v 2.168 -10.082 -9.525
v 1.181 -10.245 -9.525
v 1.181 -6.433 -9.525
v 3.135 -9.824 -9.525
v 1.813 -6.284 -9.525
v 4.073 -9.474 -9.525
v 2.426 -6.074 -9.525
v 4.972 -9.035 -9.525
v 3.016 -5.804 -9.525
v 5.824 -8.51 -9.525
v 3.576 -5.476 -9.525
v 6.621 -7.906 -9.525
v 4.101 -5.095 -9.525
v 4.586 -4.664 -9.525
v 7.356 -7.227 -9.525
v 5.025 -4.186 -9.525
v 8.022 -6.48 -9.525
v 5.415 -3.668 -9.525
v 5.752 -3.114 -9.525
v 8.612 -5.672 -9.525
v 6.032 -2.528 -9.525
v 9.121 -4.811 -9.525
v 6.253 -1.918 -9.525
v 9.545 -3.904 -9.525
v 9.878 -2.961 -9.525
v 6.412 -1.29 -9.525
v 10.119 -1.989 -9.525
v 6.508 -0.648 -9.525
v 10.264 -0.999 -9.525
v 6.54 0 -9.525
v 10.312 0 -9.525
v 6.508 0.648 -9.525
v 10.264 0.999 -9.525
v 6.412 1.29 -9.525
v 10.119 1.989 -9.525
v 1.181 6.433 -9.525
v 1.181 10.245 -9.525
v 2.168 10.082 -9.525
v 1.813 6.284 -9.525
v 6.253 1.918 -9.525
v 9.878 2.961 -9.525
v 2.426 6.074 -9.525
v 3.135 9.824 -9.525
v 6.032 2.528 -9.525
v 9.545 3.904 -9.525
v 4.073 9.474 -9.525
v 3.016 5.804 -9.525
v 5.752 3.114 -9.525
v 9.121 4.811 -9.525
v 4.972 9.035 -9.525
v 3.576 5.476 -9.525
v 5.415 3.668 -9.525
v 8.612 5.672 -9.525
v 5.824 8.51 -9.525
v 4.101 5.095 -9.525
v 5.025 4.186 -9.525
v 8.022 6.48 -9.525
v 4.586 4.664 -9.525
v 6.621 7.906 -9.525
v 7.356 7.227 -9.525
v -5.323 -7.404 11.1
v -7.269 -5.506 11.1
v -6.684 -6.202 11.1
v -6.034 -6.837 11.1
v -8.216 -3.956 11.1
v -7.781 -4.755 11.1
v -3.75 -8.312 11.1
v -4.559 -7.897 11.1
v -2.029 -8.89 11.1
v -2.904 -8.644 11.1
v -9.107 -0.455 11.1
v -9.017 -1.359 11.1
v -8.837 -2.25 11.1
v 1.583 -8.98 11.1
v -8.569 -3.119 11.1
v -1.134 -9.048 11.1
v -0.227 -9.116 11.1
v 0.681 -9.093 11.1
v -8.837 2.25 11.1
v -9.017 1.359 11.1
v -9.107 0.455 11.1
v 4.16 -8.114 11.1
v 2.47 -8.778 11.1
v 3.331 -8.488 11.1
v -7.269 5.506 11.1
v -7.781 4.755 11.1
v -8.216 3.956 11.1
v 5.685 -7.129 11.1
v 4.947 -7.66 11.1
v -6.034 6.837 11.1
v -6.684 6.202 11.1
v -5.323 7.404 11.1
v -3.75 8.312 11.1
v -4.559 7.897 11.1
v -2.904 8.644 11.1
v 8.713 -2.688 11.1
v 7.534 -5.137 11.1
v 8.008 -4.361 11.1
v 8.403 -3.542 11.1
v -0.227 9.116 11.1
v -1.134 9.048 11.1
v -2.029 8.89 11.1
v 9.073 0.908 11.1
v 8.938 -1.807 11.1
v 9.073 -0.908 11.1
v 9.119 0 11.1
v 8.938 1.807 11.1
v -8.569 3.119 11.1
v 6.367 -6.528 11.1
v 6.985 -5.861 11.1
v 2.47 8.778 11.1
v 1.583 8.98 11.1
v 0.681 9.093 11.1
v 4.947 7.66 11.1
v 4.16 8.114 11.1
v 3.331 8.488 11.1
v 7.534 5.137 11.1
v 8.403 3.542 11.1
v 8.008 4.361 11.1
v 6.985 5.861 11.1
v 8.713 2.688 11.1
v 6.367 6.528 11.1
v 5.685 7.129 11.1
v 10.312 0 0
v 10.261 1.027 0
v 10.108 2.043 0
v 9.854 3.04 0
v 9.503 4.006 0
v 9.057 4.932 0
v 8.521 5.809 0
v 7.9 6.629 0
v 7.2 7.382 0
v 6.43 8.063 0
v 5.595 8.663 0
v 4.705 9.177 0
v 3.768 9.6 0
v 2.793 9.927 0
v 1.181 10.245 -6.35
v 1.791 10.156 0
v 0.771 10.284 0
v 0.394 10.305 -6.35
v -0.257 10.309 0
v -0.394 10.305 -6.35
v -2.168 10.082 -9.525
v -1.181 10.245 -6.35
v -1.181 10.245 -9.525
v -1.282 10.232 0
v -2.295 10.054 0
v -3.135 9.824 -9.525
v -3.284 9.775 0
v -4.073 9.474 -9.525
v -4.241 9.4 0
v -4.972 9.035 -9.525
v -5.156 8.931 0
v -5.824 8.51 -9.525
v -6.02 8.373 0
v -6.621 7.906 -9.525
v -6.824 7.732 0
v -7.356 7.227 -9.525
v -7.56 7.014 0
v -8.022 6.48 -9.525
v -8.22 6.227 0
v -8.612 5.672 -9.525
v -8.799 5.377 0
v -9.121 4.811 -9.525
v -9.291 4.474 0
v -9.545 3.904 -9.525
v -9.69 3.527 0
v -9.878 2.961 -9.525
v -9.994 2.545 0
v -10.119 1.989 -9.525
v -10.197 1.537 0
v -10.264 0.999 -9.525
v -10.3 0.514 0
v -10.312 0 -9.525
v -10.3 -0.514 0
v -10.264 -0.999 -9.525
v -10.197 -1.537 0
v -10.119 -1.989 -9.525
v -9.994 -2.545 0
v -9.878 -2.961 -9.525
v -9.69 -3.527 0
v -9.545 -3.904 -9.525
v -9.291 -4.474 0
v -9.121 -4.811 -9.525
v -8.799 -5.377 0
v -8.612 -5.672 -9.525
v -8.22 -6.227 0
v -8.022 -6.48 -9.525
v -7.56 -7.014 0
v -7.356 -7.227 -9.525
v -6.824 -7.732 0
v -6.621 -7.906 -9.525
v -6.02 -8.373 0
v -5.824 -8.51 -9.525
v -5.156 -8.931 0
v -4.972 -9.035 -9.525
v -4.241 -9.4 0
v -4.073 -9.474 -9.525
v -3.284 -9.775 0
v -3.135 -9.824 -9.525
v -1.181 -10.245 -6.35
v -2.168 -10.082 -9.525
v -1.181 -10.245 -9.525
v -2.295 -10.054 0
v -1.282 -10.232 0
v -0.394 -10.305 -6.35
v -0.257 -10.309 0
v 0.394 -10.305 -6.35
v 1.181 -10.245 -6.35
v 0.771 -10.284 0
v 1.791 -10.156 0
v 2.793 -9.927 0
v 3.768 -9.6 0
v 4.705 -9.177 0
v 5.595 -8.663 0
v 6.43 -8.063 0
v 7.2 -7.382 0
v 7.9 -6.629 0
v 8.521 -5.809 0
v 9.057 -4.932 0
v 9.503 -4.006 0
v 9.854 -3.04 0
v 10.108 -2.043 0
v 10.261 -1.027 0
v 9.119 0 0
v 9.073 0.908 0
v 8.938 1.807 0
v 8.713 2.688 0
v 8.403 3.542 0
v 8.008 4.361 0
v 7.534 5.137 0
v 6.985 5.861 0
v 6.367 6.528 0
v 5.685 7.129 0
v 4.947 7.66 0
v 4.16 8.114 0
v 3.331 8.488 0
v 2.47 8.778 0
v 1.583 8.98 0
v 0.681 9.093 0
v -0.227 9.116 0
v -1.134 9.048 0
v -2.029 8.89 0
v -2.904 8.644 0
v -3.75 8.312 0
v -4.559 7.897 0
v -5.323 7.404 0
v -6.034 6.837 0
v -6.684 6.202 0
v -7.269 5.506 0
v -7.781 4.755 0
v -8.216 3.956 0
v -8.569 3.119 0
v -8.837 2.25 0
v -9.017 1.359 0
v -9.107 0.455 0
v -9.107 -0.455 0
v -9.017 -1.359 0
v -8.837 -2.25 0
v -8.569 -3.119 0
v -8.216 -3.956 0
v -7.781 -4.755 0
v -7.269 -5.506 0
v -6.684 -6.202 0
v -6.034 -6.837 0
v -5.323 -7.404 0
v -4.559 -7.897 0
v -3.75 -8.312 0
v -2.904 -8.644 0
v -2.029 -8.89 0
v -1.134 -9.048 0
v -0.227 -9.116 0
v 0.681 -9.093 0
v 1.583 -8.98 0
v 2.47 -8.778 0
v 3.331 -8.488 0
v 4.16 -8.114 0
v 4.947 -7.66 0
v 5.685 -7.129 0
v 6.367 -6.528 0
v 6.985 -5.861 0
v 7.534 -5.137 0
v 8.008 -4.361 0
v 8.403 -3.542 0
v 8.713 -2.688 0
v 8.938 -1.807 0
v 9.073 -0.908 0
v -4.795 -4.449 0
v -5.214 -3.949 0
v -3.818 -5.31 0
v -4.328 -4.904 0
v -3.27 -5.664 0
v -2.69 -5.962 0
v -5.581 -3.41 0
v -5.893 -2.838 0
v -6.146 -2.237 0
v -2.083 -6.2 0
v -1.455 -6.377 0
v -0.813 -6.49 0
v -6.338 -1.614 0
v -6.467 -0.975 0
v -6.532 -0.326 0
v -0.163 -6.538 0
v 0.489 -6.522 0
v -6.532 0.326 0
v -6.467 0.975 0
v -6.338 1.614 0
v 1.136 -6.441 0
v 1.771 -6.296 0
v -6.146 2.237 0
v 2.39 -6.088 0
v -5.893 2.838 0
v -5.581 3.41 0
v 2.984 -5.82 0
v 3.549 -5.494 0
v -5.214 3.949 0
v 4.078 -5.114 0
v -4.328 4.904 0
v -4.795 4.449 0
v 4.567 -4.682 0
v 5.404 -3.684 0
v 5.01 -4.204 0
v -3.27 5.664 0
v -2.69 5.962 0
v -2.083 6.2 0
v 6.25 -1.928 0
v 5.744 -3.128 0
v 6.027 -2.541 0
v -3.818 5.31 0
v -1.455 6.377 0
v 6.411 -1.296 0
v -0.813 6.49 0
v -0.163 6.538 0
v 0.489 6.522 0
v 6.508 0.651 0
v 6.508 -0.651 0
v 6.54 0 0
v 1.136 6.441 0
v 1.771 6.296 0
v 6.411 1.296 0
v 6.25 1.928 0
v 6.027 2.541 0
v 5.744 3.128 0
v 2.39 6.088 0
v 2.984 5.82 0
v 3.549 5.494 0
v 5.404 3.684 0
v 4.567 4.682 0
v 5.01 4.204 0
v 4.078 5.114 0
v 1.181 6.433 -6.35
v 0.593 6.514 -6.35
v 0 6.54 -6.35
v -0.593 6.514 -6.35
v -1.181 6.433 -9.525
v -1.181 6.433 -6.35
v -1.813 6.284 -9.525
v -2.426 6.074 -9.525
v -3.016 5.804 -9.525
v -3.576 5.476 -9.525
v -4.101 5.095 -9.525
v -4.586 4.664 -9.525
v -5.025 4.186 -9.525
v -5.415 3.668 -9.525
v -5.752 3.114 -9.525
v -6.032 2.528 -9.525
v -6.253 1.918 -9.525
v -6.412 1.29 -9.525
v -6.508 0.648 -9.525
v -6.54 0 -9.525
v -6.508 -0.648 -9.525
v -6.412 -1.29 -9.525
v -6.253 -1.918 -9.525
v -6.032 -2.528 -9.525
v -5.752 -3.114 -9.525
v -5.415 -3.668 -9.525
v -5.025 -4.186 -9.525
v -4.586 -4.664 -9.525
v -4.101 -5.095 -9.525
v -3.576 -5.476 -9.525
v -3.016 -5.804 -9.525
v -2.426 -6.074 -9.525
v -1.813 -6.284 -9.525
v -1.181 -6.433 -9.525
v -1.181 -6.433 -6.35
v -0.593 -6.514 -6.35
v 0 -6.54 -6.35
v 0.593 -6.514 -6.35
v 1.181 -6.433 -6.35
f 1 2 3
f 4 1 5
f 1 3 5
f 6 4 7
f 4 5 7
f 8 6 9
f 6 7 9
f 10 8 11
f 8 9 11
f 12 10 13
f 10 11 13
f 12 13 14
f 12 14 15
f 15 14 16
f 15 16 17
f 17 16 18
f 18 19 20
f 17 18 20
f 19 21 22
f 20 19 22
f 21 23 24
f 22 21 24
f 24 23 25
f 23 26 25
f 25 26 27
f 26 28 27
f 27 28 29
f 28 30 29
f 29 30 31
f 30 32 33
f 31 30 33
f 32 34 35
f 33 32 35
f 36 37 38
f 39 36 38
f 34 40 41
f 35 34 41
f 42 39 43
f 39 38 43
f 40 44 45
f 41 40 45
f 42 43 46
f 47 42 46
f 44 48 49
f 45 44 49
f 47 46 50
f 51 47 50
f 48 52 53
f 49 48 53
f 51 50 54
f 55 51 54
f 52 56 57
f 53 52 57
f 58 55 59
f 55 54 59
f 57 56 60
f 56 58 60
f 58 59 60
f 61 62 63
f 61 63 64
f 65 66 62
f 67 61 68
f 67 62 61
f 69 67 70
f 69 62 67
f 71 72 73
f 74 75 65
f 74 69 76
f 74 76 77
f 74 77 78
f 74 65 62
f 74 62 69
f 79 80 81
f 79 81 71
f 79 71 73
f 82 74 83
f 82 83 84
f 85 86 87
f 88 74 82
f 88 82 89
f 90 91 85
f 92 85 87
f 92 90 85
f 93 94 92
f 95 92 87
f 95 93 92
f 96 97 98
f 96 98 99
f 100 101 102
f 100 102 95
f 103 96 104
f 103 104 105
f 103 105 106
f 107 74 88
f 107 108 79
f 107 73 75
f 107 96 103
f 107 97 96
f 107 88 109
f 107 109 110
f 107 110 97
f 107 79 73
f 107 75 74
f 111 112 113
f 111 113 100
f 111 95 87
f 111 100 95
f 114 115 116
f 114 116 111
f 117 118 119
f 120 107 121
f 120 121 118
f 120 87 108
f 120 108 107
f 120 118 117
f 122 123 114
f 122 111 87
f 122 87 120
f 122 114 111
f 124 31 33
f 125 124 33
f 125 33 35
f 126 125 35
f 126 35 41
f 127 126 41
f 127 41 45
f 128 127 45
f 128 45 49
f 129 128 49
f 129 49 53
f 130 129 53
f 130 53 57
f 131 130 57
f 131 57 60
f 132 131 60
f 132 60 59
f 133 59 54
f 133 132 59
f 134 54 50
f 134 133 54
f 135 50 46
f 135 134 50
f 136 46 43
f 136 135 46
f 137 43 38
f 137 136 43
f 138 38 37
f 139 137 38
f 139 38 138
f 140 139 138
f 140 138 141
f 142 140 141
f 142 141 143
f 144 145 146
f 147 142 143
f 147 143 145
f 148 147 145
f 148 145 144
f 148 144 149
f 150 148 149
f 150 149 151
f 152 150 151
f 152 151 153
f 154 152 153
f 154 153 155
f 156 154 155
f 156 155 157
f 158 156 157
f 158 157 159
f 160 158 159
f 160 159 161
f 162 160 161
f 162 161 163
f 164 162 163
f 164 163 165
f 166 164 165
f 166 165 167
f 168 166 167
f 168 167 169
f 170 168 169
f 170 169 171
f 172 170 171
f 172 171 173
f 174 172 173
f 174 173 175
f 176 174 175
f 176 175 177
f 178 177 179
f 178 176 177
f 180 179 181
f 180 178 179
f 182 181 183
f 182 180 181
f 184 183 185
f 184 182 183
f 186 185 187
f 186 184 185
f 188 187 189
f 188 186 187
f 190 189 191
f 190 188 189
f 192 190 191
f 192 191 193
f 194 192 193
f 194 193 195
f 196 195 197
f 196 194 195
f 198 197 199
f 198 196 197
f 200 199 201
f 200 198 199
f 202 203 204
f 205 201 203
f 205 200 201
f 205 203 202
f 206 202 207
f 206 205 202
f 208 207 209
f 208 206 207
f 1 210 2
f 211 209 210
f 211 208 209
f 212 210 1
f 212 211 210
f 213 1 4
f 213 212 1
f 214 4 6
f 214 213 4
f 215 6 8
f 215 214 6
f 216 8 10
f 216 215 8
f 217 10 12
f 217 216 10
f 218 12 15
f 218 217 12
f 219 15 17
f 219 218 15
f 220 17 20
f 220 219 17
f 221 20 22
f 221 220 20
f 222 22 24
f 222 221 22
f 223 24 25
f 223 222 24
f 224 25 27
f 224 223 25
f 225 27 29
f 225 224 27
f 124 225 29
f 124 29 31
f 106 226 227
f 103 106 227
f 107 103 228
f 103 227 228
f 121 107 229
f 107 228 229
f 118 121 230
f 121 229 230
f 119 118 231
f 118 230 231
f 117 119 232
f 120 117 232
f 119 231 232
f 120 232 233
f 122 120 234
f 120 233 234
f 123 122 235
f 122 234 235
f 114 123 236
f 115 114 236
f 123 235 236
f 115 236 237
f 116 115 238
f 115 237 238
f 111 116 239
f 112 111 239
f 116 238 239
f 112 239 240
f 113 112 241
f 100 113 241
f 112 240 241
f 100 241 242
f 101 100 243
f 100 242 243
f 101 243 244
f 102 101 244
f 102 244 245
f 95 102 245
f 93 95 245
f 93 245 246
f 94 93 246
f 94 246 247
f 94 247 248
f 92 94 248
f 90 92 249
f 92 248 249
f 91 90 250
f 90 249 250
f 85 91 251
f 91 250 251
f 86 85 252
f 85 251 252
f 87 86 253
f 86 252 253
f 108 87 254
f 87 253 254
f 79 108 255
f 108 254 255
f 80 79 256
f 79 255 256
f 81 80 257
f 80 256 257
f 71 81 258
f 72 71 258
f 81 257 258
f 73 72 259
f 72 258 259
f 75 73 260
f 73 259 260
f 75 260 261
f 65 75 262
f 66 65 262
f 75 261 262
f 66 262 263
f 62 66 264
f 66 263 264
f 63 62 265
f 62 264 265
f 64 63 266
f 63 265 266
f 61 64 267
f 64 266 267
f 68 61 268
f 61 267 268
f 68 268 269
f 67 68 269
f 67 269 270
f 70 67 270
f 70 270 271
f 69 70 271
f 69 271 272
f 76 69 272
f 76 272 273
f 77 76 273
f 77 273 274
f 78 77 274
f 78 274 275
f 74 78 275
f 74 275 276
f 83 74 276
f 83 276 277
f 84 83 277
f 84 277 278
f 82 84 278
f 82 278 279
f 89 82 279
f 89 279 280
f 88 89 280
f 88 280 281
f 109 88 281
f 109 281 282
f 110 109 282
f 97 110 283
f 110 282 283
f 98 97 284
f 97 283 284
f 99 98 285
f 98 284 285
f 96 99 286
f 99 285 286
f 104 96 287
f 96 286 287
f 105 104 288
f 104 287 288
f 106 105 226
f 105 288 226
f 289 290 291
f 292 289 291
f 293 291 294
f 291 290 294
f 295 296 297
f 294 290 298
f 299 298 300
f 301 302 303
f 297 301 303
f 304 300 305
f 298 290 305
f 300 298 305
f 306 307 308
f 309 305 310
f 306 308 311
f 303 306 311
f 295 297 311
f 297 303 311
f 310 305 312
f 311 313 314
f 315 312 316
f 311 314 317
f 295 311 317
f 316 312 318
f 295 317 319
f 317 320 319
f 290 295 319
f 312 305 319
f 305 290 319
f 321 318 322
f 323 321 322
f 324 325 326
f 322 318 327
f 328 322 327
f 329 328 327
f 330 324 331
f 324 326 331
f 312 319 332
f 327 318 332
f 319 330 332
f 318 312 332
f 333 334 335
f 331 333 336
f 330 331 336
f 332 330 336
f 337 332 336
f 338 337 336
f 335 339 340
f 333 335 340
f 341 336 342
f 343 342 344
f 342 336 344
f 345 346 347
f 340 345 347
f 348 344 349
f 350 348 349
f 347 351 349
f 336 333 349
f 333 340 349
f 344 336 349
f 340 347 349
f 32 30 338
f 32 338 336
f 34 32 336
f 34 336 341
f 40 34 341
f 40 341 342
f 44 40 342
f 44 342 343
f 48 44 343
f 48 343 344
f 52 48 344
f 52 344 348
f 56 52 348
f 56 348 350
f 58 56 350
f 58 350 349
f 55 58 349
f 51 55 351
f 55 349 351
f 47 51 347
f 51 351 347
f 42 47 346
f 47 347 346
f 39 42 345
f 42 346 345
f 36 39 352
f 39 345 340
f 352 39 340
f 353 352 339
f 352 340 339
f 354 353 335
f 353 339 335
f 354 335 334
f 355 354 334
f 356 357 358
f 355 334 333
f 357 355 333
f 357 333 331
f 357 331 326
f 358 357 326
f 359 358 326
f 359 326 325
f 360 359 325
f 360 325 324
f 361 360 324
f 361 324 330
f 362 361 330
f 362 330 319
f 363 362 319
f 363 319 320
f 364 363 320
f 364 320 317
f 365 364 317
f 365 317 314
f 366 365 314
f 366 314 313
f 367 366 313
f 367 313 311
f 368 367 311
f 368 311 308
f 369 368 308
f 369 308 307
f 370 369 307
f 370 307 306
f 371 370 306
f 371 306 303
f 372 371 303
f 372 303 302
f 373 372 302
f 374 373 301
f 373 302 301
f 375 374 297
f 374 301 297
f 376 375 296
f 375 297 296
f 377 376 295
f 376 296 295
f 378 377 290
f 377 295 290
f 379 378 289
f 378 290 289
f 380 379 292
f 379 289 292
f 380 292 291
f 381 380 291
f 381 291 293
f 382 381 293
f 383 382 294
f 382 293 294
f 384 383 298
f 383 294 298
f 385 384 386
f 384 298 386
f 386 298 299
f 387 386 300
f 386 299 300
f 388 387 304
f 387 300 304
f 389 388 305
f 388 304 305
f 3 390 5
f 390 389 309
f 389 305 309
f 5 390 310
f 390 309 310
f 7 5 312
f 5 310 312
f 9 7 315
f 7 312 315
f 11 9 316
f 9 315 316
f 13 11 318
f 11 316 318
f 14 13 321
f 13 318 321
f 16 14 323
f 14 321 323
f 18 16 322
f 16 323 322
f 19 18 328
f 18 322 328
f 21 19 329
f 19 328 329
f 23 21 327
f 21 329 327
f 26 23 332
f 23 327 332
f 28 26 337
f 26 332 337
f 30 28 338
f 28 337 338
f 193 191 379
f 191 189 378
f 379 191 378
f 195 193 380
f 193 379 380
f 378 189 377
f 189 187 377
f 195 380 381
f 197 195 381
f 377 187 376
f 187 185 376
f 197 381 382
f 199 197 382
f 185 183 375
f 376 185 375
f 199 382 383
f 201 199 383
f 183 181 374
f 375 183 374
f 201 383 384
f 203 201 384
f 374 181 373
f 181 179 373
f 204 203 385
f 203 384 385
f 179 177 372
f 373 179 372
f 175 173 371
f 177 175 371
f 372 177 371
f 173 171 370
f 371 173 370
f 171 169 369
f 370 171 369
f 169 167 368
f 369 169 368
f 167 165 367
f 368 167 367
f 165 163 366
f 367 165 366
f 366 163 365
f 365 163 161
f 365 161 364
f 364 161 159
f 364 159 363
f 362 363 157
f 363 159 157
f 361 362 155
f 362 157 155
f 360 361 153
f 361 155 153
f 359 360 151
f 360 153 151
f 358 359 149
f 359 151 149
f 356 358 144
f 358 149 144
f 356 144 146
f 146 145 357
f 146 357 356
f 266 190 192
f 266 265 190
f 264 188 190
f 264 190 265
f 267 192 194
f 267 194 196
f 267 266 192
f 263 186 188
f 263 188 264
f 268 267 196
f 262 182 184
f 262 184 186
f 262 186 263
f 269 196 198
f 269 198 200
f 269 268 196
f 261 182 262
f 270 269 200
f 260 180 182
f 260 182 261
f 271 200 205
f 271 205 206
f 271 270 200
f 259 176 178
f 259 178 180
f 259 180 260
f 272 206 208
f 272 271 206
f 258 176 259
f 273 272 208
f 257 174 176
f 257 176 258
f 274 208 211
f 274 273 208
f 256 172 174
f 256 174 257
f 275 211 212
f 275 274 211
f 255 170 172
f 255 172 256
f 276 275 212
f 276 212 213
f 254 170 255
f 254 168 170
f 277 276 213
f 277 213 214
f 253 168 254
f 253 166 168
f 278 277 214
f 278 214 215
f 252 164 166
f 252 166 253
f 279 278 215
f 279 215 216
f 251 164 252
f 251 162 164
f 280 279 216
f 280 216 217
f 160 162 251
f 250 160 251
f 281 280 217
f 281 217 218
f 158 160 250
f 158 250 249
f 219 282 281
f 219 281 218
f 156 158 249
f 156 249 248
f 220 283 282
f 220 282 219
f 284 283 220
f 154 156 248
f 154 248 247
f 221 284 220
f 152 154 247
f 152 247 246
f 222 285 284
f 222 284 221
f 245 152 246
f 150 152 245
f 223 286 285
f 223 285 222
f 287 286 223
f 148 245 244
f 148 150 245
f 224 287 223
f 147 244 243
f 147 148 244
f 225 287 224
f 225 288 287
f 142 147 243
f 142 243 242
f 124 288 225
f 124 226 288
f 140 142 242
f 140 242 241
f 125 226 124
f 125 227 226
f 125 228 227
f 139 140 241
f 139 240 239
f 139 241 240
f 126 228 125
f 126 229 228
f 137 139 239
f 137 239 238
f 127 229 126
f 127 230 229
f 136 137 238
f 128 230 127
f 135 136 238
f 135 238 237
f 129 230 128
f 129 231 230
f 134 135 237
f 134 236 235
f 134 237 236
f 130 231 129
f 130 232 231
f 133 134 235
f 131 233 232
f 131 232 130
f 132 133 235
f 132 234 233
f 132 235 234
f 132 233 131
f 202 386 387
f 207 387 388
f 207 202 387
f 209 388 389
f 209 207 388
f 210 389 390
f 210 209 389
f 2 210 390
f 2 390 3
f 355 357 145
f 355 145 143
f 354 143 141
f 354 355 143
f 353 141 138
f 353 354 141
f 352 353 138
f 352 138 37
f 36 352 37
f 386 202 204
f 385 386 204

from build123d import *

# Parameters (mm, degrees)
SKETCH1_R               = 10.3124
SKETCH1_R_2             = 6.5405
BOSS_EXTRUDE1_DEPTH     = 9.525
SKETCH2_R               = 9.1186
BOSS_EXTRUDE2_DEPTH     = 11.0998
CUT_EXTRUDE1_DEPTH      = 19.327486122
CUT_EXTRUDE1_DEPTH_BACK = 19.327486122
SKETCH3_W               = 2.3622
SKETCH3_H               = 3.175


with BuildPart() as part:
    # Sketch1 → Boss-Extrude1 (new body)
    with BuildSketch(Plane.XY):
        Circle(SKETCH1_R)
        Circle(SKETCH1_R_2, mode=Mode.SUBTRACT)
    extrude(amount=-BOSS_EXTRUDE1_DEPTH)

    # Sketch2 → Boss-Extrude2 (add)
    with BuildSketch(Plane.XY):
        Circle(SKETCH2_R)
    extrude(amount=BOSS_EXTRUDE2_DEPTH)

    # Sketch3 → Cut-Extrude1 (cut, two sides: drawn at the far end of the back side and taken through both)
    with BuildSketch(Plane(origin=(0, 0, 0), x_dir=(1, 0, 0), z_dir=(0, 1, 0)).offset(-CUT_EXTRUDE1_DEPTH_BACK)):
        with Locations((0, 7.9375)):
            Rectangle(SKETCH3_W, SKETCH3_H)
    extrude(amount=CUT_EXTRUDE1_DEPTH + CUT_EXTRUDE1_DEPTH_BACK, mode=Mode.SUBTRACT)


solid = part.part
